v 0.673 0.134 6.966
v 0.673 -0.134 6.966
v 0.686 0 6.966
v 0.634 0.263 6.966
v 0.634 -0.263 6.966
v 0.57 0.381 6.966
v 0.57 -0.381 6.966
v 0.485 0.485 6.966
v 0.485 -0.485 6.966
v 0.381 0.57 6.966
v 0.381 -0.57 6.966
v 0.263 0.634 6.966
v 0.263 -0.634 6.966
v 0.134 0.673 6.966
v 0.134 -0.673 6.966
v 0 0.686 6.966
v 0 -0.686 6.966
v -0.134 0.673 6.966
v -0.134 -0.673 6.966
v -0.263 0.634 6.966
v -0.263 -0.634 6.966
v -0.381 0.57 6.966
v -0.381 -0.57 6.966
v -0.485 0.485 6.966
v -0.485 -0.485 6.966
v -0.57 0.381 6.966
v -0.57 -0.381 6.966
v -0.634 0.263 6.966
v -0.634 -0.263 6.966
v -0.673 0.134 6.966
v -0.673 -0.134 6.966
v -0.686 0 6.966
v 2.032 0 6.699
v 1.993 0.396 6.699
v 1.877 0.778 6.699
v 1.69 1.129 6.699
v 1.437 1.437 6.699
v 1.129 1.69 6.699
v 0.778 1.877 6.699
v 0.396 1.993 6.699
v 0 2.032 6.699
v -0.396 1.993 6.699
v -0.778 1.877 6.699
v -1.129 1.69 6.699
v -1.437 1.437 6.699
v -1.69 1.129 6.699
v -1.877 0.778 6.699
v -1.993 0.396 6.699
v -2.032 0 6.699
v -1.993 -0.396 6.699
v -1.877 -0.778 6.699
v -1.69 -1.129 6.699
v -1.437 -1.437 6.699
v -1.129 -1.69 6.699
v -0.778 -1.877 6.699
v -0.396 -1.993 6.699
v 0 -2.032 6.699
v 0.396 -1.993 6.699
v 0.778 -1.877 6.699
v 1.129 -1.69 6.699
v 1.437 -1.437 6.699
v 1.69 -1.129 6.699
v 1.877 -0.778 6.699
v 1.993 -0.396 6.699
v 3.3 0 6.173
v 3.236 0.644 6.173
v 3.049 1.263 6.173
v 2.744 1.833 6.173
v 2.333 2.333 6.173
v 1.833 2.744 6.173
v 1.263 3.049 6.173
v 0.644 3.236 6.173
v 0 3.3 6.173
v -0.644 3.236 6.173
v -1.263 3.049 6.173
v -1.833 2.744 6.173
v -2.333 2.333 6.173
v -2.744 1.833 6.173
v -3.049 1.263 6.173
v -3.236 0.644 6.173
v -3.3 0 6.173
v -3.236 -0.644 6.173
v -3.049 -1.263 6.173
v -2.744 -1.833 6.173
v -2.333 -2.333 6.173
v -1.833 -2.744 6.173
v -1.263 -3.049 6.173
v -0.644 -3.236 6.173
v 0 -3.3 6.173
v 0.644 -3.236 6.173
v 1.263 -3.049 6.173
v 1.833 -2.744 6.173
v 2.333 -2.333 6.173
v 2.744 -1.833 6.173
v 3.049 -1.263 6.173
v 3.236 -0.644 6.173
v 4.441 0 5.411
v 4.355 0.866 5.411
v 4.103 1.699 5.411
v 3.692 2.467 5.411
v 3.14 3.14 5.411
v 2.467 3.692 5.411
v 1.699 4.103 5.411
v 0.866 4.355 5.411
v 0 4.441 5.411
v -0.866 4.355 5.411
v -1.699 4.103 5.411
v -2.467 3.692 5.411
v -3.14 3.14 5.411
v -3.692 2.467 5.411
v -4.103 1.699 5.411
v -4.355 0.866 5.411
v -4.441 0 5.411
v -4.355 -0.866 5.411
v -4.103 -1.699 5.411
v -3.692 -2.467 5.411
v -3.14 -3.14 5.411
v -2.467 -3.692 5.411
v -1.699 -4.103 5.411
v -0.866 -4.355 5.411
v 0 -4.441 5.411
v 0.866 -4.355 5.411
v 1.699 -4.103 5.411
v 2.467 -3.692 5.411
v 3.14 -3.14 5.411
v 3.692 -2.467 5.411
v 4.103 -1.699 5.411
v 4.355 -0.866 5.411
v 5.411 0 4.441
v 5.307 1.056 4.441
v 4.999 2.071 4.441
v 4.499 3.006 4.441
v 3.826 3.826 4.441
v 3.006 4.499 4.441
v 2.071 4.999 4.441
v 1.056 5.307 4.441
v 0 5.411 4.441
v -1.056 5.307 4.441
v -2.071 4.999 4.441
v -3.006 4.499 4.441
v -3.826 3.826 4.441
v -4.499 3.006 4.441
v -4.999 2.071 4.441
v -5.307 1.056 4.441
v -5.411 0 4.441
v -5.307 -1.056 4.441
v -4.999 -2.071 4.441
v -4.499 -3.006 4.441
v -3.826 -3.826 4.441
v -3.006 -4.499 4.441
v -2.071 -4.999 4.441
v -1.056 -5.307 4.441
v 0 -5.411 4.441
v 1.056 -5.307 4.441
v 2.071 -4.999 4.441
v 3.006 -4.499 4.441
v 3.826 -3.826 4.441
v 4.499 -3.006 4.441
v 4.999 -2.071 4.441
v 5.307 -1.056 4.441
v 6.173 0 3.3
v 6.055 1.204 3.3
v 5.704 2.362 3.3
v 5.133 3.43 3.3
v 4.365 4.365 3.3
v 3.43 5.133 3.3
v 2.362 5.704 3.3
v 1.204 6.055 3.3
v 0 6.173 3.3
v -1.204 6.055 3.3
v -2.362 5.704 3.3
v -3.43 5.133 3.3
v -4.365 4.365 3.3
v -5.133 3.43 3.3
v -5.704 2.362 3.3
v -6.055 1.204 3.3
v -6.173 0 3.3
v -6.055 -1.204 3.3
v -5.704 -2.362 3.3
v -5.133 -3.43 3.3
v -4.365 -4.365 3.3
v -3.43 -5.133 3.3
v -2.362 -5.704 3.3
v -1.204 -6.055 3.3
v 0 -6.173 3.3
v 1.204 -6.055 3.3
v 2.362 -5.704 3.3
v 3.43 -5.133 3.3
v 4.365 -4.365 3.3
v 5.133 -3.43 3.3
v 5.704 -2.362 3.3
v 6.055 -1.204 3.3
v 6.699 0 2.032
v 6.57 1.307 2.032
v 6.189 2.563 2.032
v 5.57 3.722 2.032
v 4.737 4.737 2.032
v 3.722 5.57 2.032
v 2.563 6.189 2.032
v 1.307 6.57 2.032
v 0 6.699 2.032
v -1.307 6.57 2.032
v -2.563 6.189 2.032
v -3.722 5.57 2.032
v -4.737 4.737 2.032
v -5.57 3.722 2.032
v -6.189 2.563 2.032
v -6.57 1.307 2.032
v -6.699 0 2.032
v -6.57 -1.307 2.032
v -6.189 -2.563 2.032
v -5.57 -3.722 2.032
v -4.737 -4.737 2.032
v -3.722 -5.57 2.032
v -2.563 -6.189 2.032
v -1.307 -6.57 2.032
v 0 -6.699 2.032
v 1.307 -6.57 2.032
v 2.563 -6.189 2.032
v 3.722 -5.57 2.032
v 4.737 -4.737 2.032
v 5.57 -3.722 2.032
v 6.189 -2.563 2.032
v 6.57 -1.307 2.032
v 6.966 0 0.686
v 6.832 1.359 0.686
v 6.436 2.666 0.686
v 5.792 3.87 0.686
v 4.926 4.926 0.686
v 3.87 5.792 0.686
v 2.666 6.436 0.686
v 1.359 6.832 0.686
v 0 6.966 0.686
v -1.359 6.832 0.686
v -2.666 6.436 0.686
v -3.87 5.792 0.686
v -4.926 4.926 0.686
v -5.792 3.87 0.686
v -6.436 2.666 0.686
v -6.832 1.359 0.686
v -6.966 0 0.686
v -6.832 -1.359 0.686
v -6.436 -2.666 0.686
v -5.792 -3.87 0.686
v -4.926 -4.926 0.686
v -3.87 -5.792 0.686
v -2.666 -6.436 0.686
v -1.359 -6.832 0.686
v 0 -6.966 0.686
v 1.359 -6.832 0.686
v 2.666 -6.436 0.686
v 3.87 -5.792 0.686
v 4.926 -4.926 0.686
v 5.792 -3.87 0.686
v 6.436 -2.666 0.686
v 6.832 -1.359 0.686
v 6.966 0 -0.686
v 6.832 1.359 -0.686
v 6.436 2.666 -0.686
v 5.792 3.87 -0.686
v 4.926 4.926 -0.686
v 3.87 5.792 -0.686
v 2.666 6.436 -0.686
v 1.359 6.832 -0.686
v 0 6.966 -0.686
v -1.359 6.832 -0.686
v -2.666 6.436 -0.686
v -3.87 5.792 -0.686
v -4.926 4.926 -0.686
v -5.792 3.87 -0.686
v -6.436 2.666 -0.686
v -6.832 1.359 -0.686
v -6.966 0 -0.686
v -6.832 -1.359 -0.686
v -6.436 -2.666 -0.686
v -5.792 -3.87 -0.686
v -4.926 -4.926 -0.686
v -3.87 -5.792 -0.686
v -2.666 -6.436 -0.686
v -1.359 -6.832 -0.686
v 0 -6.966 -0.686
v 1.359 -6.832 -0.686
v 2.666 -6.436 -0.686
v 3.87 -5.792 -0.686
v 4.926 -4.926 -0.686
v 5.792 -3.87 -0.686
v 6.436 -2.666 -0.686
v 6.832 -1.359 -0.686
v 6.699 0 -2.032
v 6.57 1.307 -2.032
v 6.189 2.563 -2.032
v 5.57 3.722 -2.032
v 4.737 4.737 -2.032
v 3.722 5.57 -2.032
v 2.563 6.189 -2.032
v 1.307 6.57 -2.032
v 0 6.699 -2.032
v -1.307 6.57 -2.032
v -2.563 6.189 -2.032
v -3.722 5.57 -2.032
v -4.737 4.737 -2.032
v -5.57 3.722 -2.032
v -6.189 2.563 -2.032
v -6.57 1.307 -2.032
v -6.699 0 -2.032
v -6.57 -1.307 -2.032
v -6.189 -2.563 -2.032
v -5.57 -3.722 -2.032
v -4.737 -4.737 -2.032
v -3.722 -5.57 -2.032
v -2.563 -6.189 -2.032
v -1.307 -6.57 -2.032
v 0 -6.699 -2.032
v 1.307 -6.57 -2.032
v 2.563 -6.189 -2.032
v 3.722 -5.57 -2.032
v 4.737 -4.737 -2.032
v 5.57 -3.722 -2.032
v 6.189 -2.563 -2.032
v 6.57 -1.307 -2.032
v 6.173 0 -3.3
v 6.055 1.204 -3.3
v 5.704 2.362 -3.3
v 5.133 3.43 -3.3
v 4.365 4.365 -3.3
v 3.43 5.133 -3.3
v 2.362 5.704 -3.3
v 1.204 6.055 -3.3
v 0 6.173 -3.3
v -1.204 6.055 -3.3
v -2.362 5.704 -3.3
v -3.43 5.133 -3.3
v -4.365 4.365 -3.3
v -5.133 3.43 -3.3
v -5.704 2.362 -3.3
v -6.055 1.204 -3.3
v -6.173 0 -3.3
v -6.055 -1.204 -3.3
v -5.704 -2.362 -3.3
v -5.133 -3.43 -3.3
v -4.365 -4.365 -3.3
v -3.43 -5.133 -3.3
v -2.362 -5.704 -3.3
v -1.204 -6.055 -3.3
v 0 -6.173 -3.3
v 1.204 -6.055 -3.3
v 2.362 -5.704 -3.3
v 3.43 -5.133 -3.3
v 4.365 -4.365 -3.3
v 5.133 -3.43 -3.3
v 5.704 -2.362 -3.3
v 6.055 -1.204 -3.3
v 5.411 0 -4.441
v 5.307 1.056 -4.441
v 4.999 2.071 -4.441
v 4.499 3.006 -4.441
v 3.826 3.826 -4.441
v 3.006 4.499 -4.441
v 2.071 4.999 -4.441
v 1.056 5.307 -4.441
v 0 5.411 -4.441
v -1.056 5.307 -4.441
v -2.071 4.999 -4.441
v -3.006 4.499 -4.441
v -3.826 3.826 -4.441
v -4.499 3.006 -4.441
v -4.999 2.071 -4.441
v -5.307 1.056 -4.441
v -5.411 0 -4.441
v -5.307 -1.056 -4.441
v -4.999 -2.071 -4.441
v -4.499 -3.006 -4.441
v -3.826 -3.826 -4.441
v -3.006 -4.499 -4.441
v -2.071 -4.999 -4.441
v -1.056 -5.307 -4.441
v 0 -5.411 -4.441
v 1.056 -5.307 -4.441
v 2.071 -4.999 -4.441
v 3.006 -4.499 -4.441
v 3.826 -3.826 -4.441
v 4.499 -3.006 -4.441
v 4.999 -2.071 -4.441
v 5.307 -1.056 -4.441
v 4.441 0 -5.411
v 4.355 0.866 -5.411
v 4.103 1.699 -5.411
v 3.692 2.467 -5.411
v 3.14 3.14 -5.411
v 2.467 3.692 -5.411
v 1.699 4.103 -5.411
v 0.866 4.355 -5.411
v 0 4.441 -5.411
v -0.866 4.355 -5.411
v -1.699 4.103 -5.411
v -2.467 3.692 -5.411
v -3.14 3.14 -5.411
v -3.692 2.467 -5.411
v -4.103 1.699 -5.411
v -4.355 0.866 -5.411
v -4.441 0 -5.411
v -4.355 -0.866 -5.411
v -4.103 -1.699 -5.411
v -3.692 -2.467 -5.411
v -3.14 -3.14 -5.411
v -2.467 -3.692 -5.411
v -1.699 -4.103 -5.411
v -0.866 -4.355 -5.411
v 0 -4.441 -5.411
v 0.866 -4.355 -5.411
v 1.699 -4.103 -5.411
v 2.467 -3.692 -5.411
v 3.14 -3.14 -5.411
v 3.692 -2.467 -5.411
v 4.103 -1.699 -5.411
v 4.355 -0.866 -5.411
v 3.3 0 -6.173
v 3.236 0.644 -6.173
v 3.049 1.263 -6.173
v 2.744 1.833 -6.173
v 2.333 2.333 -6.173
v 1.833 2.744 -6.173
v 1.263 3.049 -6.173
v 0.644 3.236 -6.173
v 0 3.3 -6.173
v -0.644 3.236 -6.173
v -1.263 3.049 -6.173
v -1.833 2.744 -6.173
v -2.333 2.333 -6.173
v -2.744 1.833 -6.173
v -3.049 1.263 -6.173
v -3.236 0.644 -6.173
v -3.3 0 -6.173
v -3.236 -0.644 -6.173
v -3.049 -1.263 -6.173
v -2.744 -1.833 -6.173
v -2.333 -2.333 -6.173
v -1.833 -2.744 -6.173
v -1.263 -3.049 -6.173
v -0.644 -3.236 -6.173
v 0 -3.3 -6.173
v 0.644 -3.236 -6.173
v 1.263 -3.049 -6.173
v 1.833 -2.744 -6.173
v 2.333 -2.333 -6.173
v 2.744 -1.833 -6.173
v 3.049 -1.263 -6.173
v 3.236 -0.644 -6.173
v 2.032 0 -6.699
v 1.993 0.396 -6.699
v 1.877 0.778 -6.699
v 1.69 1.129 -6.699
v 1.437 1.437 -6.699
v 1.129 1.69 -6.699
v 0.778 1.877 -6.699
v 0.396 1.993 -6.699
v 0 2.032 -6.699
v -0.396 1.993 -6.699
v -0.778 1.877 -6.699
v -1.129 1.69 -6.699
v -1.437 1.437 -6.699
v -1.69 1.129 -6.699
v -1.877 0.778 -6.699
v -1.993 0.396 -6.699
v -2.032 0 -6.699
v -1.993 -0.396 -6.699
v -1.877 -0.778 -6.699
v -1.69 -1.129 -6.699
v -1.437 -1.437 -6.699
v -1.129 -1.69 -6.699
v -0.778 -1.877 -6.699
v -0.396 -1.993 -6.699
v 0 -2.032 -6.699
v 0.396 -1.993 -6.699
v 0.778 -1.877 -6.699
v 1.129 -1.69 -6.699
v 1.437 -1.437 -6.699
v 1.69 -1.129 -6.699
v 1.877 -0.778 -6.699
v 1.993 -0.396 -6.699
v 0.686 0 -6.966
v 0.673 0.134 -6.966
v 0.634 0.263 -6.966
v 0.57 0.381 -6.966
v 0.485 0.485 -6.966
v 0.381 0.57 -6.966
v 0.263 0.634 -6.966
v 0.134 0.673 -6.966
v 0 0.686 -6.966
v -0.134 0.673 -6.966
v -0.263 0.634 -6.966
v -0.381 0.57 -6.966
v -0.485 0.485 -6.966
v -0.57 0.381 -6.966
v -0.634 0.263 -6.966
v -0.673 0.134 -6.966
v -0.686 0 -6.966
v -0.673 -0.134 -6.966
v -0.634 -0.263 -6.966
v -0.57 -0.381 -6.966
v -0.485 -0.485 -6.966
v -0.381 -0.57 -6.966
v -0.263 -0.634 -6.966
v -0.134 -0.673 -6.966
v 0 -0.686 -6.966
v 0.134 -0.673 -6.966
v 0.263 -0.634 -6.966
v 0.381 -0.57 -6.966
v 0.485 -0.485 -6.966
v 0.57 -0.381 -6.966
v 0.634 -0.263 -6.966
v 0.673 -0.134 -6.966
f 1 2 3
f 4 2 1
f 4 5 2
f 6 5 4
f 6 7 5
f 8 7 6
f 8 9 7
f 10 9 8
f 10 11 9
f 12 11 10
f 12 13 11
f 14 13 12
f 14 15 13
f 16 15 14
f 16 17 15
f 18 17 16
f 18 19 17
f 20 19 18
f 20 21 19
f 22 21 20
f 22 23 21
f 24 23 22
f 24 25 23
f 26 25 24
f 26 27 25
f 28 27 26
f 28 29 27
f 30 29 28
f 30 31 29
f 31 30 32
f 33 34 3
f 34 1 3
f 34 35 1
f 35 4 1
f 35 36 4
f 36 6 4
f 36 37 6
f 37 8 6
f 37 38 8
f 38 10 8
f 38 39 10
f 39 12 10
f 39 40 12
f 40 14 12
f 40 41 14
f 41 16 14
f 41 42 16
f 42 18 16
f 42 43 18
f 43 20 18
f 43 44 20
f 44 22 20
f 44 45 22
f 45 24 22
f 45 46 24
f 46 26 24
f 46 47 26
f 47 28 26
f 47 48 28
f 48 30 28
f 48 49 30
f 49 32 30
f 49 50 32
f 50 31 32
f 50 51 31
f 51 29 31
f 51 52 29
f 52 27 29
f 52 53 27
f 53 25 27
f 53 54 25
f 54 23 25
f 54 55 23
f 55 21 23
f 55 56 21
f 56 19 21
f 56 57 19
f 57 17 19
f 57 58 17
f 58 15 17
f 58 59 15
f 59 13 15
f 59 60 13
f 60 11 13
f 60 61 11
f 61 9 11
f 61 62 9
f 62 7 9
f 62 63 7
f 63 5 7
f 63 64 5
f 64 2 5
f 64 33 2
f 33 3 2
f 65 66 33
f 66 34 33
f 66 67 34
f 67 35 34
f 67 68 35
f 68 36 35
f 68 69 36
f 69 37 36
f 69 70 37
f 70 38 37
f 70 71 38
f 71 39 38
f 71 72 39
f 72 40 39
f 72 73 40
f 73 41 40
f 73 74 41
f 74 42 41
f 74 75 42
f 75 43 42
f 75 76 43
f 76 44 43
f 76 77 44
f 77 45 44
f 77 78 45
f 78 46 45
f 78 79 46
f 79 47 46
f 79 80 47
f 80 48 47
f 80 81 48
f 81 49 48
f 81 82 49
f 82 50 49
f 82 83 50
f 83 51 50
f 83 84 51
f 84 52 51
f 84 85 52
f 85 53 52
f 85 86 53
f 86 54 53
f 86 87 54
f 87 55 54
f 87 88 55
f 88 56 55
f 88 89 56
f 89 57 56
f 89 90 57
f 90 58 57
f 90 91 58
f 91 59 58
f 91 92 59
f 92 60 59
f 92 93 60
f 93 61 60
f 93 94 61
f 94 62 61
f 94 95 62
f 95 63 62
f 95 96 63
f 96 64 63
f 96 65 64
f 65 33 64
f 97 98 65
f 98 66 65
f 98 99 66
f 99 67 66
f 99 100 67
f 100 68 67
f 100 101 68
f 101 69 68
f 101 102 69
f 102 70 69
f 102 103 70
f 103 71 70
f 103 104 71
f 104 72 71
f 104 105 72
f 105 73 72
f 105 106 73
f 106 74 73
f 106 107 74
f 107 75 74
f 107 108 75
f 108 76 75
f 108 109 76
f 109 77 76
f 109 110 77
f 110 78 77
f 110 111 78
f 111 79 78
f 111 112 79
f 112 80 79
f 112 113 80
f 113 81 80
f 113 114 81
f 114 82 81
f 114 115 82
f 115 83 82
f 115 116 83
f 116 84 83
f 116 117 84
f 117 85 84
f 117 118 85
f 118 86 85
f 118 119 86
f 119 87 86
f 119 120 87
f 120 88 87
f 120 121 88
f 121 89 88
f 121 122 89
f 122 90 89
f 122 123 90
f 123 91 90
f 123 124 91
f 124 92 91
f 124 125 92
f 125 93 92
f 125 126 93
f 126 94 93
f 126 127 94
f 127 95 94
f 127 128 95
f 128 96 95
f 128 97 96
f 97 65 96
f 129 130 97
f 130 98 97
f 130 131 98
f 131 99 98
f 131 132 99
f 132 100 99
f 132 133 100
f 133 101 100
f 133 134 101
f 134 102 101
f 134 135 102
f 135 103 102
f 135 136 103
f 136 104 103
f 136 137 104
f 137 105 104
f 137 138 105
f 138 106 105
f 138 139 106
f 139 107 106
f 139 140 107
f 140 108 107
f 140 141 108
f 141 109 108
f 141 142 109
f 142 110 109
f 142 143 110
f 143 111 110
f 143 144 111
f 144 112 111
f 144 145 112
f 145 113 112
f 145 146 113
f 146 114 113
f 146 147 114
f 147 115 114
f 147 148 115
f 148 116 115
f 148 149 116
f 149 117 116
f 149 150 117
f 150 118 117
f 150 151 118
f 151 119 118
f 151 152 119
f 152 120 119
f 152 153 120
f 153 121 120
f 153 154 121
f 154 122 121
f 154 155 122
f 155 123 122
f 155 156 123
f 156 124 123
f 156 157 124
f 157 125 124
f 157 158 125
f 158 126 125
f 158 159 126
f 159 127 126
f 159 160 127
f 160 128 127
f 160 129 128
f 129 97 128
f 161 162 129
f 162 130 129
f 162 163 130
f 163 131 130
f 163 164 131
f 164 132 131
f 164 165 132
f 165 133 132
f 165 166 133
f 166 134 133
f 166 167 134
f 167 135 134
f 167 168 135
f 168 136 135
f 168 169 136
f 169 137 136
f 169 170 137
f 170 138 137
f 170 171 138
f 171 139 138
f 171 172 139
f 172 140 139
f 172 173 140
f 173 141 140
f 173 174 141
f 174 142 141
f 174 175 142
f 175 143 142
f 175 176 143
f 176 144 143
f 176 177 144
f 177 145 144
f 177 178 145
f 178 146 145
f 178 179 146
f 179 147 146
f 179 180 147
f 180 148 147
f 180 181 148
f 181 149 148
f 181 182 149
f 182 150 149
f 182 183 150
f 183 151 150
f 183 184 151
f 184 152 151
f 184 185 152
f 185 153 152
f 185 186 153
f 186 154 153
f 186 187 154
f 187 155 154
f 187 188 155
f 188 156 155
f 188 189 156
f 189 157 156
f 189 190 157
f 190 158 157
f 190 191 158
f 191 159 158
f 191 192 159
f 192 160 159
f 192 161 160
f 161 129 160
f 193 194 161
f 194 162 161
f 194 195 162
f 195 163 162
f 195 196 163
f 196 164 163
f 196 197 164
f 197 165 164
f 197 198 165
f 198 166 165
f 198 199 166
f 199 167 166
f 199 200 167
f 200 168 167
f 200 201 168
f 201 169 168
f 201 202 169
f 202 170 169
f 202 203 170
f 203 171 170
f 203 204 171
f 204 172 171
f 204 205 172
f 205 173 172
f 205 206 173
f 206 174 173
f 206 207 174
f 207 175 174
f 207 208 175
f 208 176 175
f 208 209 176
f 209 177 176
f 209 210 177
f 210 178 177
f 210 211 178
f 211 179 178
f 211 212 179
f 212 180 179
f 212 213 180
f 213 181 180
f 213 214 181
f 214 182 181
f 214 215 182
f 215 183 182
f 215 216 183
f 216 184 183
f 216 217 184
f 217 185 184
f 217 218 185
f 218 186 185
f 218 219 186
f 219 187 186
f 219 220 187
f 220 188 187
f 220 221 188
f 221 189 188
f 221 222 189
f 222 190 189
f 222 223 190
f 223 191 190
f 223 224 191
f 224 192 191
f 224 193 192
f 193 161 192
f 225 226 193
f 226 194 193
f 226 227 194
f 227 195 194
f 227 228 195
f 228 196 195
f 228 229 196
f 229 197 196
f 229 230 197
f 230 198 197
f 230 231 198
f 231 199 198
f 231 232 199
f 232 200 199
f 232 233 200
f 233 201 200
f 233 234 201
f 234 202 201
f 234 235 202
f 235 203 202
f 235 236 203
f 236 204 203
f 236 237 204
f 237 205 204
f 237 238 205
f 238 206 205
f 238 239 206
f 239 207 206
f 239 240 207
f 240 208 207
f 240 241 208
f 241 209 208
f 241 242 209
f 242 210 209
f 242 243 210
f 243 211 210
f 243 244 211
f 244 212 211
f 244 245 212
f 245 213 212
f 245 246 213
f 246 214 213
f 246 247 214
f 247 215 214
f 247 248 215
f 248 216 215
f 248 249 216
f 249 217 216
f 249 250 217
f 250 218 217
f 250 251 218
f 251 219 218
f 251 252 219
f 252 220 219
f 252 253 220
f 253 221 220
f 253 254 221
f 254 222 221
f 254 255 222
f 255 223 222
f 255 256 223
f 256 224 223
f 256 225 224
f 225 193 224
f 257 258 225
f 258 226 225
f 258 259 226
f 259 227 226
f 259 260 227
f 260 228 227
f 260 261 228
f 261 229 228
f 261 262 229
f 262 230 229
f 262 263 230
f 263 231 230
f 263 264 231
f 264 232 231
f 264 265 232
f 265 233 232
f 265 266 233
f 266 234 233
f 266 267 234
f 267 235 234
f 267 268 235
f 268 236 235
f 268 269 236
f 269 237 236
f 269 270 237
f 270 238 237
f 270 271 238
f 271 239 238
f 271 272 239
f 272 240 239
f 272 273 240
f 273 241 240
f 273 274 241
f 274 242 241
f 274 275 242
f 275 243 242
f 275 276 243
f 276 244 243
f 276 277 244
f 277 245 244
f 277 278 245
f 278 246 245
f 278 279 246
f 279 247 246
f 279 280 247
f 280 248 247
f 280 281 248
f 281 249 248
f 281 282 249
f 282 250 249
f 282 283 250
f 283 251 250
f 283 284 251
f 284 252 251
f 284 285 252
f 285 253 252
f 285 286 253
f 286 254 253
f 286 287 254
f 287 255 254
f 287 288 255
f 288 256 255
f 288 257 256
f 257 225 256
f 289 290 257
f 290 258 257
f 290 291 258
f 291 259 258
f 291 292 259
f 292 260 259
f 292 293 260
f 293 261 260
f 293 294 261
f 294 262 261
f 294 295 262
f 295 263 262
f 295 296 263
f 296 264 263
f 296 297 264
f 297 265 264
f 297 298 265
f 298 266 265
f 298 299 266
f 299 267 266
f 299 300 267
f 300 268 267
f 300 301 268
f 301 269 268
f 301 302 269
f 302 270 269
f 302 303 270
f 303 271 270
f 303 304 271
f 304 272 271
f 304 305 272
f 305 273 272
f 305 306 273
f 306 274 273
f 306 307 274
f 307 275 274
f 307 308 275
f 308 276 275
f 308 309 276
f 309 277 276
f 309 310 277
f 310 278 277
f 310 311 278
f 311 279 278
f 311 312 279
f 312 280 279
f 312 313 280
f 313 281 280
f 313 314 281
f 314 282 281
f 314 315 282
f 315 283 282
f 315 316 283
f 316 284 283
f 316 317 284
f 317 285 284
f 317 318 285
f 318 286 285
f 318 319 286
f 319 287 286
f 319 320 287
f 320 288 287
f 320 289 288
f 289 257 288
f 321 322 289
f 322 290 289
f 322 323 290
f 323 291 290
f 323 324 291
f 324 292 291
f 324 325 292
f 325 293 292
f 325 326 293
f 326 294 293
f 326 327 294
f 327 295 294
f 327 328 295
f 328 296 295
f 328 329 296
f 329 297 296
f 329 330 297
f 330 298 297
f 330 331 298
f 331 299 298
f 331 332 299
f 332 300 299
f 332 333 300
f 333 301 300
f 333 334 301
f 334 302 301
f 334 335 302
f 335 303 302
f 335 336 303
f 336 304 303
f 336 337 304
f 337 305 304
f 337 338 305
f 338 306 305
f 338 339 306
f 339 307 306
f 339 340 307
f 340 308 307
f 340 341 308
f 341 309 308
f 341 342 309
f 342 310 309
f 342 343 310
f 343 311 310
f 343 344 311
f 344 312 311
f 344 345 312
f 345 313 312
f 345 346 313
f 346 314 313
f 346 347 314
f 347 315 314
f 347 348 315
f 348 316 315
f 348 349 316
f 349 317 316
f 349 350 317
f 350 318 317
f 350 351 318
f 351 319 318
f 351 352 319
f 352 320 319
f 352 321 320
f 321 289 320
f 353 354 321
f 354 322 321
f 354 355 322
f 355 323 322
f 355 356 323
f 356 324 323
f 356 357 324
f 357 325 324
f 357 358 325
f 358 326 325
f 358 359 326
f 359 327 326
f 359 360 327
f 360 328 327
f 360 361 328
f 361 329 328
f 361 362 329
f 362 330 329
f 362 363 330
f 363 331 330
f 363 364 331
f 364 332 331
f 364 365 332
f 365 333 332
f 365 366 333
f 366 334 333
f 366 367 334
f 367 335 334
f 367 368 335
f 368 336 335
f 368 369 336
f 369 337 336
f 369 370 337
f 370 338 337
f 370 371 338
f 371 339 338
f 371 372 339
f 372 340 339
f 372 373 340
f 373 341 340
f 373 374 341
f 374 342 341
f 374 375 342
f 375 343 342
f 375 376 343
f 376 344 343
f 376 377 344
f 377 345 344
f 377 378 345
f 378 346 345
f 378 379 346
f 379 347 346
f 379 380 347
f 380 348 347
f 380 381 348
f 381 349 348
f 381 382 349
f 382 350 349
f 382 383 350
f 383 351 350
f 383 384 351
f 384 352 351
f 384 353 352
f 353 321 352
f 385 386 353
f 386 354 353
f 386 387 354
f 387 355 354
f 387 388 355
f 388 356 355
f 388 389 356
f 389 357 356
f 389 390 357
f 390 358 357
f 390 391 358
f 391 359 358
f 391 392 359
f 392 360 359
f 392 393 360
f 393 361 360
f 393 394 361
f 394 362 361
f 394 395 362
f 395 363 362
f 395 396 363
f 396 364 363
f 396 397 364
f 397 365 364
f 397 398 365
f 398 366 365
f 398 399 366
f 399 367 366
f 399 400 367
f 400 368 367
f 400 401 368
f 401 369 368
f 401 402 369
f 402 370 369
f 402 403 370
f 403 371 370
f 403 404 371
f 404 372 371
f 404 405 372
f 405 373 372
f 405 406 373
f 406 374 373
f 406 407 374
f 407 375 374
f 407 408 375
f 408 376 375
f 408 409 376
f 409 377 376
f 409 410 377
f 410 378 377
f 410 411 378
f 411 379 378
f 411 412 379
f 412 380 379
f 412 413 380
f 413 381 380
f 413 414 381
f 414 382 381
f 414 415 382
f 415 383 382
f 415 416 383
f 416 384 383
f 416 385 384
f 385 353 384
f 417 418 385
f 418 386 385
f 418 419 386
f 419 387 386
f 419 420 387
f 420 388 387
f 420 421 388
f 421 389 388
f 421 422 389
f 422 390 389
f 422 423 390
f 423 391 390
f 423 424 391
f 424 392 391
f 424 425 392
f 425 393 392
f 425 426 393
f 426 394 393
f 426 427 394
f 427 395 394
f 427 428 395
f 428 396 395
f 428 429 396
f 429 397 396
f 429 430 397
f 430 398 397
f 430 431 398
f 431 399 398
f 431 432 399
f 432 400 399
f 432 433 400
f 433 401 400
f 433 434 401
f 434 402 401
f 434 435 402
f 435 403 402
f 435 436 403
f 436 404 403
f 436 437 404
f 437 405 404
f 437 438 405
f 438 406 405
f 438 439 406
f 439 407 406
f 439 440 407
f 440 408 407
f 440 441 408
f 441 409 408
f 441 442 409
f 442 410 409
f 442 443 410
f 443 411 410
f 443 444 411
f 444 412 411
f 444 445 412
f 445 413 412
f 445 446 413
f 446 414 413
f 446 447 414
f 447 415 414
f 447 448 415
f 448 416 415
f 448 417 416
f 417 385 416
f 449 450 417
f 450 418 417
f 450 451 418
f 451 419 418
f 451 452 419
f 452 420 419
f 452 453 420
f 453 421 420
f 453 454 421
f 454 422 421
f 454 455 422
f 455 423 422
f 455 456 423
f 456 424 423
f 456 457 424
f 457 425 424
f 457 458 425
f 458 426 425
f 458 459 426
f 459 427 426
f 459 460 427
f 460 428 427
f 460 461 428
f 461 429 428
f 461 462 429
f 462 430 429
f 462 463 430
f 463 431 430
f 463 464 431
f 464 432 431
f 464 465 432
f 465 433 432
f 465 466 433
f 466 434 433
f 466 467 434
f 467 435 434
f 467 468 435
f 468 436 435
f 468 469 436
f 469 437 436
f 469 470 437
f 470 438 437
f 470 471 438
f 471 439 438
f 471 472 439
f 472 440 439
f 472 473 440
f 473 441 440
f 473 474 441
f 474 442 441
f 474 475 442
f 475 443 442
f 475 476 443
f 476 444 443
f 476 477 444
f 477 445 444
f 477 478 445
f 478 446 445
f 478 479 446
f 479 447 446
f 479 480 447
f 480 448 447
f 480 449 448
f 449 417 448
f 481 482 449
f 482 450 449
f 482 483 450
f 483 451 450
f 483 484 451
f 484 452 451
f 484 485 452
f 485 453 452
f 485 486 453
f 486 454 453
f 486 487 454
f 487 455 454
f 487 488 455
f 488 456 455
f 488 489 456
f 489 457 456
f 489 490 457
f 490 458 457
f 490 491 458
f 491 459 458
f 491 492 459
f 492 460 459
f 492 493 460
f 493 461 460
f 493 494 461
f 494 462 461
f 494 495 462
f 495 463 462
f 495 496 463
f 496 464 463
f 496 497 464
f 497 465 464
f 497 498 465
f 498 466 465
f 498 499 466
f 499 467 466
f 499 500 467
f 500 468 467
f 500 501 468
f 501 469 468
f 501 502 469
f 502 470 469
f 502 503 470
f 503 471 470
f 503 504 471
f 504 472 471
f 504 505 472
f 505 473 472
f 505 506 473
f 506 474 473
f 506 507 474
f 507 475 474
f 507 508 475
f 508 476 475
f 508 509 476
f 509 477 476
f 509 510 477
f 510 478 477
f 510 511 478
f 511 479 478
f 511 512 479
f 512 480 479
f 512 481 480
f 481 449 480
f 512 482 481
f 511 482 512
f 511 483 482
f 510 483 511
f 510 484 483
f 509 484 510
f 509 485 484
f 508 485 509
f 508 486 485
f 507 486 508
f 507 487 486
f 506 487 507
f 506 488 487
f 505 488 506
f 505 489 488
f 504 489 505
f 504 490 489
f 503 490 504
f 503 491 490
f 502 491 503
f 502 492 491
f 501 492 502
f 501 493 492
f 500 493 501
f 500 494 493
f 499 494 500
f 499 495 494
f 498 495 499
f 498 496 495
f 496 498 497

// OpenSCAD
// Construct: if / else selecting between two solids.
pick = 3;
if (pick > 2) {
    sphere(r = 7, $fn = 32);
} else {
    cube(7);
}
